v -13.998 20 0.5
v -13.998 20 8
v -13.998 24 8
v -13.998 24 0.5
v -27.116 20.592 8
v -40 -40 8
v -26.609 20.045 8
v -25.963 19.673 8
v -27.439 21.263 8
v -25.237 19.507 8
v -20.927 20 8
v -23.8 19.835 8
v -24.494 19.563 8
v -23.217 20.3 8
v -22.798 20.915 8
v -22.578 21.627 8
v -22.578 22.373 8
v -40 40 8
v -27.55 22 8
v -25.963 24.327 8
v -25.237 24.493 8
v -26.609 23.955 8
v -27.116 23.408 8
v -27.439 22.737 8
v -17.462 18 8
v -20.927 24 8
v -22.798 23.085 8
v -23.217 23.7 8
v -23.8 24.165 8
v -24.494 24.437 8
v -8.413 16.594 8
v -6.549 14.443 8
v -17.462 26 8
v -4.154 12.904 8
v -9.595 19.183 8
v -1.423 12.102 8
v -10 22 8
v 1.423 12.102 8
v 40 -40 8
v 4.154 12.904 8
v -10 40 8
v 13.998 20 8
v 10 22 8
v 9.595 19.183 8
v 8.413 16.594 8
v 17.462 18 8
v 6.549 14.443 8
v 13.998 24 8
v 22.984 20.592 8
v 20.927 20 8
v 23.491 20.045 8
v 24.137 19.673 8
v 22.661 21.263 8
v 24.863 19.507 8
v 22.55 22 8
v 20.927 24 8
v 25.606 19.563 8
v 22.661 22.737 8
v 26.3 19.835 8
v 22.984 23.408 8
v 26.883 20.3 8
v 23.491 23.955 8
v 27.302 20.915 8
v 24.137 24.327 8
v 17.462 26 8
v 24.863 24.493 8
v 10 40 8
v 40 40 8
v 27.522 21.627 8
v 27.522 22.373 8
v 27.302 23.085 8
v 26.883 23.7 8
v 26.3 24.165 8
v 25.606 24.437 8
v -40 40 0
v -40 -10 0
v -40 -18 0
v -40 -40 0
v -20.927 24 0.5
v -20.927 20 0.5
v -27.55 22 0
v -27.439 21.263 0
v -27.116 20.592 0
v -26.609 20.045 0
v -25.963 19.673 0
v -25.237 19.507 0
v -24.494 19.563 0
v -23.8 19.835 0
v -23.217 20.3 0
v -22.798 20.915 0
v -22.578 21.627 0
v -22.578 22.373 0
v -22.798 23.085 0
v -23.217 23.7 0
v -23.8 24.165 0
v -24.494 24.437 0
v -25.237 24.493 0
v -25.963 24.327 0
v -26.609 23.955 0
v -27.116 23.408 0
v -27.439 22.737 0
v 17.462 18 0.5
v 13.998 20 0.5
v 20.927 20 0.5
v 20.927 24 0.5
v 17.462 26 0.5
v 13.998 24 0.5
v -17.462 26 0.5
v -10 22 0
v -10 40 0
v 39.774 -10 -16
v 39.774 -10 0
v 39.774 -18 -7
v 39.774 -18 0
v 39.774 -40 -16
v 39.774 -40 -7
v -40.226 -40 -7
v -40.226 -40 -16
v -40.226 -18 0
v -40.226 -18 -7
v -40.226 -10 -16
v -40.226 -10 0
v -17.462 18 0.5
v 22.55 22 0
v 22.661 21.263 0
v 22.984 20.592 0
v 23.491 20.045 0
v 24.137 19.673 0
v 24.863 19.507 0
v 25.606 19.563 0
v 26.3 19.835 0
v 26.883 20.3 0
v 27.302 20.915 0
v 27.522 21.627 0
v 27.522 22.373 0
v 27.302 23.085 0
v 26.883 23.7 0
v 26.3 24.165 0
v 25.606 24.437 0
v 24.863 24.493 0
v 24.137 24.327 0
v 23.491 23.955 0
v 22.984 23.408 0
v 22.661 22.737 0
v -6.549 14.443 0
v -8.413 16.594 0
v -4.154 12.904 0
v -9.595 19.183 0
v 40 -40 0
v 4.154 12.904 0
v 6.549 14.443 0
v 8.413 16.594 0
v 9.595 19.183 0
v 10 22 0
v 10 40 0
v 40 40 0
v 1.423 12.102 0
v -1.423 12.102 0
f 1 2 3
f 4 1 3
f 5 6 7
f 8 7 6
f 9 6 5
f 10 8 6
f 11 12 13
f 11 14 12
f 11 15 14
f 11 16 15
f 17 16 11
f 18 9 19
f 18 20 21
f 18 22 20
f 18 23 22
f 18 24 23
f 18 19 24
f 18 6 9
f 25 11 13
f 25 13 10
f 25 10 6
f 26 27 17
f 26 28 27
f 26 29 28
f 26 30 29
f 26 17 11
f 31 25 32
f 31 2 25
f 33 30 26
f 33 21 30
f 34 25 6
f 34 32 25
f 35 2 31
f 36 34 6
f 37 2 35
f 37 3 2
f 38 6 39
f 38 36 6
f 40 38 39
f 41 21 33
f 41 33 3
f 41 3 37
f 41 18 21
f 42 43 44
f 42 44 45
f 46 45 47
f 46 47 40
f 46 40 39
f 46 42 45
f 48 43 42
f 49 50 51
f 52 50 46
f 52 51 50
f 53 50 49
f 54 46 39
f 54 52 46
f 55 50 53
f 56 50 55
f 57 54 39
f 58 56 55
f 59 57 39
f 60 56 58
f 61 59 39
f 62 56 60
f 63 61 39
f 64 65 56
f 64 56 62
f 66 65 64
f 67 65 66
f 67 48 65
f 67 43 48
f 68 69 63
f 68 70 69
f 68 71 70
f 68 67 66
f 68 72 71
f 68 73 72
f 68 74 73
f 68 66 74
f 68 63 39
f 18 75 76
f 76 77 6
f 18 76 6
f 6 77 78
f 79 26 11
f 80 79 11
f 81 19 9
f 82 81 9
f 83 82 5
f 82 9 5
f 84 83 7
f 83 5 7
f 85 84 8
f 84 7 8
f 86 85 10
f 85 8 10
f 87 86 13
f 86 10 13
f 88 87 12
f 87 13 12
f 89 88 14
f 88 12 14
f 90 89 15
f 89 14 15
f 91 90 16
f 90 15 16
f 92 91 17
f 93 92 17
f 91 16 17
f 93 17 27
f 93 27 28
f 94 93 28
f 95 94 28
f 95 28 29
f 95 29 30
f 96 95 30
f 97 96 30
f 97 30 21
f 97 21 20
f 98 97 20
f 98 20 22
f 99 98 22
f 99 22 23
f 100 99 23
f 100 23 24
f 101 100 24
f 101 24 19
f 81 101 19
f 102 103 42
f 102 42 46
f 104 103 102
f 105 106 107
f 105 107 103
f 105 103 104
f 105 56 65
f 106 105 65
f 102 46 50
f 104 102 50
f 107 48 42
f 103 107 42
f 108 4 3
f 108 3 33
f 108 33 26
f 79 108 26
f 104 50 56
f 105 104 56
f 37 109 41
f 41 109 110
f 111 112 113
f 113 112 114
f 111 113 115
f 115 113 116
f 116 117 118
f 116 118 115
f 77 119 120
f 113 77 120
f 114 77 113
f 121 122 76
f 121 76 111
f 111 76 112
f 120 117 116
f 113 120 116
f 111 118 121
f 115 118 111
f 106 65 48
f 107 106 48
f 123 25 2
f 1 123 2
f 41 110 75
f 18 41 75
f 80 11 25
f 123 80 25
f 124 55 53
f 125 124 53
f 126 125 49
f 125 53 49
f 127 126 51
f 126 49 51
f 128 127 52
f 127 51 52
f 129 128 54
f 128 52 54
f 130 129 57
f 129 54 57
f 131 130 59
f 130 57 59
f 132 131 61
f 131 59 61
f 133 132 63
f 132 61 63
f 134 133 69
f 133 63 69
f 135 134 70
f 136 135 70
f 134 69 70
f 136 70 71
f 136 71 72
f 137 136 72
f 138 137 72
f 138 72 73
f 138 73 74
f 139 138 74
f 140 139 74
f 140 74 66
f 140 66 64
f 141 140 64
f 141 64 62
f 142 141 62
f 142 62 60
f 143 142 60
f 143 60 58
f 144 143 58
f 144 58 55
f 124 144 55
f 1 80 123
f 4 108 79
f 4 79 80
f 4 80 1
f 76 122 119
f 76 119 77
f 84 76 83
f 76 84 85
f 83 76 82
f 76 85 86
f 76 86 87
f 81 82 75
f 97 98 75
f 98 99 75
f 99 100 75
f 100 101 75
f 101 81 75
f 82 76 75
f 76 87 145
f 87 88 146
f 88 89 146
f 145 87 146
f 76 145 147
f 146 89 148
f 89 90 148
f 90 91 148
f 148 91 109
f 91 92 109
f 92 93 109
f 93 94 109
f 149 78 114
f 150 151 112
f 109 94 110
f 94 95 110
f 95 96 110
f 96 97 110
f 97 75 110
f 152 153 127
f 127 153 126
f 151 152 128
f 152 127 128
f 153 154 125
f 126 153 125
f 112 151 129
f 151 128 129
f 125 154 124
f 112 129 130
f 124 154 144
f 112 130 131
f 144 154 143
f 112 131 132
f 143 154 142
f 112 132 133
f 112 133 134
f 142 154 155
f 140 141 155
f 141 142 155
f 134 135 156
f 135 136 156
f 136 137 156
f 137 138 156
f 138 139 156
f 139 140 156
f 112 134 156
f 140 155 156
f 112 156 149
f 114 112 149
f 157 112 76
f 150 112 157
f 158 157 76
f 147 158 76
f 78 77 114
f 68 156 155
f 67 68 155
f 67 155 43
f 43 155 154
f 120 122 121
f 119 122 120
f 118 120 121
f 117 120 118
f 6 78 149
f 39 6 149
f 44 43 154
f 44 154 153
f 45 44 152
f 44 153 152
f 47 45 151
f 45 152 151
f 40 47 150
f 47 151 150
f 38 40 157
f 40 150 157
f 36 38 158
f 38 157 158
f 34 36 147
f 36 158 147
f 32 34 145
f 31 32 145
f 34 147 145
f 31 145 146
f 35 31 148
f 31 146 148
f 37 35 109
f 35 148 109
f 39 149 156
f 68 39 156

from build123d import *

# Parameters (mm, degrees)
F1_DEPTH  = 8
F2_D      = 5
F3_D      = 5
F5_DEPTH  = 7.5
F7_W      = 80
F7_H      = 8
F8_DEPTH  = 7
F9_W      = 80
F9_H      = 30
F10_DEPTH = 9


with BuildPart() as f1:
    # F0 (on Top) → F1 (new body)
    with BuildSketch(Plane.XY):
        with BuildLine():
            Line((40, -40), (40, 40))
            Line((40, 40), (10, 40))
            Line((10, 40), (10, 22))
            ThreePointArc((10, 22), (0, 12), (-10, 22))
            Line((-10, 22), (-10, 40))
            Line((-10, 40), (-40, 40))
            Line((-40, 40), (-40, -40))
            Line((-40, -40), (40, -40))
        make_face()
    extrude(amount=F1_DEPTH)

    # F2 (through all)
    with Locations(Plane(origin=(0, 0, 0), x_dir=(1, 0, 0), z_dir=(0, 0, -1))):
        with Locations((25.05, -22)):
            Hole(F2_D / 2)

    # F3 (through all)
    with Locations(Plane(origin=(0, 0, 0), x_dir=(1, 0, 0), z_dir=(0, 0, -1))):
        with Locations((-25.05, -22)):
            Hole(F3_D / 2)


with BuildPart() as f5:
    # F4 (on face) → F5 (new body, symmetric)
    with BuildSketch(Plane.XY.offset(8)):
        Polygon((-17.4625, 18), (-13.9983983849, 20), (-13.9983983849, 24), (-17.4625, 26), (-20.9266016151, 24), (-20.9266016151, 20), align=None)
    extrude(amount=F5_DEPTH, both=True)


with BuildPart() as f5b:
    # F4 (on face) → F5, piece 2 (new body, symmetric)
    with BuildSketch(Plane.XY.offset(8)):
        Polygon((17.4625, 18), (20.9266016151, 20), (20.9266016151, 24), (17.4625, 26), (13.9983983849, 24), (13.9983983849, 20), align=None)
    extrude(amount=F5_DEPTH, both=True)


with BuildPart() as f1_1:
    add(f1.part)

    # F6: cut F5, F5b
    add(f5.part, mode=Mode.SUBTRACT)
    add(f5b.part, mode=Mode.SUBTRACT)

    # F7 (on face) → F8 (join)
    with BuildSketch(Plane.XY):
        with Locations((-0.2263514698, -14)):
            Rectangle(F7_W, F7_H)
    extrude(amount=-F8_DEPTH)

    # F9 (on face) → F10 (join)
    with BuildSketch(Plane(origin=(0, 0, -7), x_dir=(1, 0, 0), z_dir=(0, 0, -1))):
        with Locations((-0.2263514698, 25)):
            Rectangle(F9_W, F9_H)
    extrude(amount=F10_DEPTH)


solid = f1_1.part
